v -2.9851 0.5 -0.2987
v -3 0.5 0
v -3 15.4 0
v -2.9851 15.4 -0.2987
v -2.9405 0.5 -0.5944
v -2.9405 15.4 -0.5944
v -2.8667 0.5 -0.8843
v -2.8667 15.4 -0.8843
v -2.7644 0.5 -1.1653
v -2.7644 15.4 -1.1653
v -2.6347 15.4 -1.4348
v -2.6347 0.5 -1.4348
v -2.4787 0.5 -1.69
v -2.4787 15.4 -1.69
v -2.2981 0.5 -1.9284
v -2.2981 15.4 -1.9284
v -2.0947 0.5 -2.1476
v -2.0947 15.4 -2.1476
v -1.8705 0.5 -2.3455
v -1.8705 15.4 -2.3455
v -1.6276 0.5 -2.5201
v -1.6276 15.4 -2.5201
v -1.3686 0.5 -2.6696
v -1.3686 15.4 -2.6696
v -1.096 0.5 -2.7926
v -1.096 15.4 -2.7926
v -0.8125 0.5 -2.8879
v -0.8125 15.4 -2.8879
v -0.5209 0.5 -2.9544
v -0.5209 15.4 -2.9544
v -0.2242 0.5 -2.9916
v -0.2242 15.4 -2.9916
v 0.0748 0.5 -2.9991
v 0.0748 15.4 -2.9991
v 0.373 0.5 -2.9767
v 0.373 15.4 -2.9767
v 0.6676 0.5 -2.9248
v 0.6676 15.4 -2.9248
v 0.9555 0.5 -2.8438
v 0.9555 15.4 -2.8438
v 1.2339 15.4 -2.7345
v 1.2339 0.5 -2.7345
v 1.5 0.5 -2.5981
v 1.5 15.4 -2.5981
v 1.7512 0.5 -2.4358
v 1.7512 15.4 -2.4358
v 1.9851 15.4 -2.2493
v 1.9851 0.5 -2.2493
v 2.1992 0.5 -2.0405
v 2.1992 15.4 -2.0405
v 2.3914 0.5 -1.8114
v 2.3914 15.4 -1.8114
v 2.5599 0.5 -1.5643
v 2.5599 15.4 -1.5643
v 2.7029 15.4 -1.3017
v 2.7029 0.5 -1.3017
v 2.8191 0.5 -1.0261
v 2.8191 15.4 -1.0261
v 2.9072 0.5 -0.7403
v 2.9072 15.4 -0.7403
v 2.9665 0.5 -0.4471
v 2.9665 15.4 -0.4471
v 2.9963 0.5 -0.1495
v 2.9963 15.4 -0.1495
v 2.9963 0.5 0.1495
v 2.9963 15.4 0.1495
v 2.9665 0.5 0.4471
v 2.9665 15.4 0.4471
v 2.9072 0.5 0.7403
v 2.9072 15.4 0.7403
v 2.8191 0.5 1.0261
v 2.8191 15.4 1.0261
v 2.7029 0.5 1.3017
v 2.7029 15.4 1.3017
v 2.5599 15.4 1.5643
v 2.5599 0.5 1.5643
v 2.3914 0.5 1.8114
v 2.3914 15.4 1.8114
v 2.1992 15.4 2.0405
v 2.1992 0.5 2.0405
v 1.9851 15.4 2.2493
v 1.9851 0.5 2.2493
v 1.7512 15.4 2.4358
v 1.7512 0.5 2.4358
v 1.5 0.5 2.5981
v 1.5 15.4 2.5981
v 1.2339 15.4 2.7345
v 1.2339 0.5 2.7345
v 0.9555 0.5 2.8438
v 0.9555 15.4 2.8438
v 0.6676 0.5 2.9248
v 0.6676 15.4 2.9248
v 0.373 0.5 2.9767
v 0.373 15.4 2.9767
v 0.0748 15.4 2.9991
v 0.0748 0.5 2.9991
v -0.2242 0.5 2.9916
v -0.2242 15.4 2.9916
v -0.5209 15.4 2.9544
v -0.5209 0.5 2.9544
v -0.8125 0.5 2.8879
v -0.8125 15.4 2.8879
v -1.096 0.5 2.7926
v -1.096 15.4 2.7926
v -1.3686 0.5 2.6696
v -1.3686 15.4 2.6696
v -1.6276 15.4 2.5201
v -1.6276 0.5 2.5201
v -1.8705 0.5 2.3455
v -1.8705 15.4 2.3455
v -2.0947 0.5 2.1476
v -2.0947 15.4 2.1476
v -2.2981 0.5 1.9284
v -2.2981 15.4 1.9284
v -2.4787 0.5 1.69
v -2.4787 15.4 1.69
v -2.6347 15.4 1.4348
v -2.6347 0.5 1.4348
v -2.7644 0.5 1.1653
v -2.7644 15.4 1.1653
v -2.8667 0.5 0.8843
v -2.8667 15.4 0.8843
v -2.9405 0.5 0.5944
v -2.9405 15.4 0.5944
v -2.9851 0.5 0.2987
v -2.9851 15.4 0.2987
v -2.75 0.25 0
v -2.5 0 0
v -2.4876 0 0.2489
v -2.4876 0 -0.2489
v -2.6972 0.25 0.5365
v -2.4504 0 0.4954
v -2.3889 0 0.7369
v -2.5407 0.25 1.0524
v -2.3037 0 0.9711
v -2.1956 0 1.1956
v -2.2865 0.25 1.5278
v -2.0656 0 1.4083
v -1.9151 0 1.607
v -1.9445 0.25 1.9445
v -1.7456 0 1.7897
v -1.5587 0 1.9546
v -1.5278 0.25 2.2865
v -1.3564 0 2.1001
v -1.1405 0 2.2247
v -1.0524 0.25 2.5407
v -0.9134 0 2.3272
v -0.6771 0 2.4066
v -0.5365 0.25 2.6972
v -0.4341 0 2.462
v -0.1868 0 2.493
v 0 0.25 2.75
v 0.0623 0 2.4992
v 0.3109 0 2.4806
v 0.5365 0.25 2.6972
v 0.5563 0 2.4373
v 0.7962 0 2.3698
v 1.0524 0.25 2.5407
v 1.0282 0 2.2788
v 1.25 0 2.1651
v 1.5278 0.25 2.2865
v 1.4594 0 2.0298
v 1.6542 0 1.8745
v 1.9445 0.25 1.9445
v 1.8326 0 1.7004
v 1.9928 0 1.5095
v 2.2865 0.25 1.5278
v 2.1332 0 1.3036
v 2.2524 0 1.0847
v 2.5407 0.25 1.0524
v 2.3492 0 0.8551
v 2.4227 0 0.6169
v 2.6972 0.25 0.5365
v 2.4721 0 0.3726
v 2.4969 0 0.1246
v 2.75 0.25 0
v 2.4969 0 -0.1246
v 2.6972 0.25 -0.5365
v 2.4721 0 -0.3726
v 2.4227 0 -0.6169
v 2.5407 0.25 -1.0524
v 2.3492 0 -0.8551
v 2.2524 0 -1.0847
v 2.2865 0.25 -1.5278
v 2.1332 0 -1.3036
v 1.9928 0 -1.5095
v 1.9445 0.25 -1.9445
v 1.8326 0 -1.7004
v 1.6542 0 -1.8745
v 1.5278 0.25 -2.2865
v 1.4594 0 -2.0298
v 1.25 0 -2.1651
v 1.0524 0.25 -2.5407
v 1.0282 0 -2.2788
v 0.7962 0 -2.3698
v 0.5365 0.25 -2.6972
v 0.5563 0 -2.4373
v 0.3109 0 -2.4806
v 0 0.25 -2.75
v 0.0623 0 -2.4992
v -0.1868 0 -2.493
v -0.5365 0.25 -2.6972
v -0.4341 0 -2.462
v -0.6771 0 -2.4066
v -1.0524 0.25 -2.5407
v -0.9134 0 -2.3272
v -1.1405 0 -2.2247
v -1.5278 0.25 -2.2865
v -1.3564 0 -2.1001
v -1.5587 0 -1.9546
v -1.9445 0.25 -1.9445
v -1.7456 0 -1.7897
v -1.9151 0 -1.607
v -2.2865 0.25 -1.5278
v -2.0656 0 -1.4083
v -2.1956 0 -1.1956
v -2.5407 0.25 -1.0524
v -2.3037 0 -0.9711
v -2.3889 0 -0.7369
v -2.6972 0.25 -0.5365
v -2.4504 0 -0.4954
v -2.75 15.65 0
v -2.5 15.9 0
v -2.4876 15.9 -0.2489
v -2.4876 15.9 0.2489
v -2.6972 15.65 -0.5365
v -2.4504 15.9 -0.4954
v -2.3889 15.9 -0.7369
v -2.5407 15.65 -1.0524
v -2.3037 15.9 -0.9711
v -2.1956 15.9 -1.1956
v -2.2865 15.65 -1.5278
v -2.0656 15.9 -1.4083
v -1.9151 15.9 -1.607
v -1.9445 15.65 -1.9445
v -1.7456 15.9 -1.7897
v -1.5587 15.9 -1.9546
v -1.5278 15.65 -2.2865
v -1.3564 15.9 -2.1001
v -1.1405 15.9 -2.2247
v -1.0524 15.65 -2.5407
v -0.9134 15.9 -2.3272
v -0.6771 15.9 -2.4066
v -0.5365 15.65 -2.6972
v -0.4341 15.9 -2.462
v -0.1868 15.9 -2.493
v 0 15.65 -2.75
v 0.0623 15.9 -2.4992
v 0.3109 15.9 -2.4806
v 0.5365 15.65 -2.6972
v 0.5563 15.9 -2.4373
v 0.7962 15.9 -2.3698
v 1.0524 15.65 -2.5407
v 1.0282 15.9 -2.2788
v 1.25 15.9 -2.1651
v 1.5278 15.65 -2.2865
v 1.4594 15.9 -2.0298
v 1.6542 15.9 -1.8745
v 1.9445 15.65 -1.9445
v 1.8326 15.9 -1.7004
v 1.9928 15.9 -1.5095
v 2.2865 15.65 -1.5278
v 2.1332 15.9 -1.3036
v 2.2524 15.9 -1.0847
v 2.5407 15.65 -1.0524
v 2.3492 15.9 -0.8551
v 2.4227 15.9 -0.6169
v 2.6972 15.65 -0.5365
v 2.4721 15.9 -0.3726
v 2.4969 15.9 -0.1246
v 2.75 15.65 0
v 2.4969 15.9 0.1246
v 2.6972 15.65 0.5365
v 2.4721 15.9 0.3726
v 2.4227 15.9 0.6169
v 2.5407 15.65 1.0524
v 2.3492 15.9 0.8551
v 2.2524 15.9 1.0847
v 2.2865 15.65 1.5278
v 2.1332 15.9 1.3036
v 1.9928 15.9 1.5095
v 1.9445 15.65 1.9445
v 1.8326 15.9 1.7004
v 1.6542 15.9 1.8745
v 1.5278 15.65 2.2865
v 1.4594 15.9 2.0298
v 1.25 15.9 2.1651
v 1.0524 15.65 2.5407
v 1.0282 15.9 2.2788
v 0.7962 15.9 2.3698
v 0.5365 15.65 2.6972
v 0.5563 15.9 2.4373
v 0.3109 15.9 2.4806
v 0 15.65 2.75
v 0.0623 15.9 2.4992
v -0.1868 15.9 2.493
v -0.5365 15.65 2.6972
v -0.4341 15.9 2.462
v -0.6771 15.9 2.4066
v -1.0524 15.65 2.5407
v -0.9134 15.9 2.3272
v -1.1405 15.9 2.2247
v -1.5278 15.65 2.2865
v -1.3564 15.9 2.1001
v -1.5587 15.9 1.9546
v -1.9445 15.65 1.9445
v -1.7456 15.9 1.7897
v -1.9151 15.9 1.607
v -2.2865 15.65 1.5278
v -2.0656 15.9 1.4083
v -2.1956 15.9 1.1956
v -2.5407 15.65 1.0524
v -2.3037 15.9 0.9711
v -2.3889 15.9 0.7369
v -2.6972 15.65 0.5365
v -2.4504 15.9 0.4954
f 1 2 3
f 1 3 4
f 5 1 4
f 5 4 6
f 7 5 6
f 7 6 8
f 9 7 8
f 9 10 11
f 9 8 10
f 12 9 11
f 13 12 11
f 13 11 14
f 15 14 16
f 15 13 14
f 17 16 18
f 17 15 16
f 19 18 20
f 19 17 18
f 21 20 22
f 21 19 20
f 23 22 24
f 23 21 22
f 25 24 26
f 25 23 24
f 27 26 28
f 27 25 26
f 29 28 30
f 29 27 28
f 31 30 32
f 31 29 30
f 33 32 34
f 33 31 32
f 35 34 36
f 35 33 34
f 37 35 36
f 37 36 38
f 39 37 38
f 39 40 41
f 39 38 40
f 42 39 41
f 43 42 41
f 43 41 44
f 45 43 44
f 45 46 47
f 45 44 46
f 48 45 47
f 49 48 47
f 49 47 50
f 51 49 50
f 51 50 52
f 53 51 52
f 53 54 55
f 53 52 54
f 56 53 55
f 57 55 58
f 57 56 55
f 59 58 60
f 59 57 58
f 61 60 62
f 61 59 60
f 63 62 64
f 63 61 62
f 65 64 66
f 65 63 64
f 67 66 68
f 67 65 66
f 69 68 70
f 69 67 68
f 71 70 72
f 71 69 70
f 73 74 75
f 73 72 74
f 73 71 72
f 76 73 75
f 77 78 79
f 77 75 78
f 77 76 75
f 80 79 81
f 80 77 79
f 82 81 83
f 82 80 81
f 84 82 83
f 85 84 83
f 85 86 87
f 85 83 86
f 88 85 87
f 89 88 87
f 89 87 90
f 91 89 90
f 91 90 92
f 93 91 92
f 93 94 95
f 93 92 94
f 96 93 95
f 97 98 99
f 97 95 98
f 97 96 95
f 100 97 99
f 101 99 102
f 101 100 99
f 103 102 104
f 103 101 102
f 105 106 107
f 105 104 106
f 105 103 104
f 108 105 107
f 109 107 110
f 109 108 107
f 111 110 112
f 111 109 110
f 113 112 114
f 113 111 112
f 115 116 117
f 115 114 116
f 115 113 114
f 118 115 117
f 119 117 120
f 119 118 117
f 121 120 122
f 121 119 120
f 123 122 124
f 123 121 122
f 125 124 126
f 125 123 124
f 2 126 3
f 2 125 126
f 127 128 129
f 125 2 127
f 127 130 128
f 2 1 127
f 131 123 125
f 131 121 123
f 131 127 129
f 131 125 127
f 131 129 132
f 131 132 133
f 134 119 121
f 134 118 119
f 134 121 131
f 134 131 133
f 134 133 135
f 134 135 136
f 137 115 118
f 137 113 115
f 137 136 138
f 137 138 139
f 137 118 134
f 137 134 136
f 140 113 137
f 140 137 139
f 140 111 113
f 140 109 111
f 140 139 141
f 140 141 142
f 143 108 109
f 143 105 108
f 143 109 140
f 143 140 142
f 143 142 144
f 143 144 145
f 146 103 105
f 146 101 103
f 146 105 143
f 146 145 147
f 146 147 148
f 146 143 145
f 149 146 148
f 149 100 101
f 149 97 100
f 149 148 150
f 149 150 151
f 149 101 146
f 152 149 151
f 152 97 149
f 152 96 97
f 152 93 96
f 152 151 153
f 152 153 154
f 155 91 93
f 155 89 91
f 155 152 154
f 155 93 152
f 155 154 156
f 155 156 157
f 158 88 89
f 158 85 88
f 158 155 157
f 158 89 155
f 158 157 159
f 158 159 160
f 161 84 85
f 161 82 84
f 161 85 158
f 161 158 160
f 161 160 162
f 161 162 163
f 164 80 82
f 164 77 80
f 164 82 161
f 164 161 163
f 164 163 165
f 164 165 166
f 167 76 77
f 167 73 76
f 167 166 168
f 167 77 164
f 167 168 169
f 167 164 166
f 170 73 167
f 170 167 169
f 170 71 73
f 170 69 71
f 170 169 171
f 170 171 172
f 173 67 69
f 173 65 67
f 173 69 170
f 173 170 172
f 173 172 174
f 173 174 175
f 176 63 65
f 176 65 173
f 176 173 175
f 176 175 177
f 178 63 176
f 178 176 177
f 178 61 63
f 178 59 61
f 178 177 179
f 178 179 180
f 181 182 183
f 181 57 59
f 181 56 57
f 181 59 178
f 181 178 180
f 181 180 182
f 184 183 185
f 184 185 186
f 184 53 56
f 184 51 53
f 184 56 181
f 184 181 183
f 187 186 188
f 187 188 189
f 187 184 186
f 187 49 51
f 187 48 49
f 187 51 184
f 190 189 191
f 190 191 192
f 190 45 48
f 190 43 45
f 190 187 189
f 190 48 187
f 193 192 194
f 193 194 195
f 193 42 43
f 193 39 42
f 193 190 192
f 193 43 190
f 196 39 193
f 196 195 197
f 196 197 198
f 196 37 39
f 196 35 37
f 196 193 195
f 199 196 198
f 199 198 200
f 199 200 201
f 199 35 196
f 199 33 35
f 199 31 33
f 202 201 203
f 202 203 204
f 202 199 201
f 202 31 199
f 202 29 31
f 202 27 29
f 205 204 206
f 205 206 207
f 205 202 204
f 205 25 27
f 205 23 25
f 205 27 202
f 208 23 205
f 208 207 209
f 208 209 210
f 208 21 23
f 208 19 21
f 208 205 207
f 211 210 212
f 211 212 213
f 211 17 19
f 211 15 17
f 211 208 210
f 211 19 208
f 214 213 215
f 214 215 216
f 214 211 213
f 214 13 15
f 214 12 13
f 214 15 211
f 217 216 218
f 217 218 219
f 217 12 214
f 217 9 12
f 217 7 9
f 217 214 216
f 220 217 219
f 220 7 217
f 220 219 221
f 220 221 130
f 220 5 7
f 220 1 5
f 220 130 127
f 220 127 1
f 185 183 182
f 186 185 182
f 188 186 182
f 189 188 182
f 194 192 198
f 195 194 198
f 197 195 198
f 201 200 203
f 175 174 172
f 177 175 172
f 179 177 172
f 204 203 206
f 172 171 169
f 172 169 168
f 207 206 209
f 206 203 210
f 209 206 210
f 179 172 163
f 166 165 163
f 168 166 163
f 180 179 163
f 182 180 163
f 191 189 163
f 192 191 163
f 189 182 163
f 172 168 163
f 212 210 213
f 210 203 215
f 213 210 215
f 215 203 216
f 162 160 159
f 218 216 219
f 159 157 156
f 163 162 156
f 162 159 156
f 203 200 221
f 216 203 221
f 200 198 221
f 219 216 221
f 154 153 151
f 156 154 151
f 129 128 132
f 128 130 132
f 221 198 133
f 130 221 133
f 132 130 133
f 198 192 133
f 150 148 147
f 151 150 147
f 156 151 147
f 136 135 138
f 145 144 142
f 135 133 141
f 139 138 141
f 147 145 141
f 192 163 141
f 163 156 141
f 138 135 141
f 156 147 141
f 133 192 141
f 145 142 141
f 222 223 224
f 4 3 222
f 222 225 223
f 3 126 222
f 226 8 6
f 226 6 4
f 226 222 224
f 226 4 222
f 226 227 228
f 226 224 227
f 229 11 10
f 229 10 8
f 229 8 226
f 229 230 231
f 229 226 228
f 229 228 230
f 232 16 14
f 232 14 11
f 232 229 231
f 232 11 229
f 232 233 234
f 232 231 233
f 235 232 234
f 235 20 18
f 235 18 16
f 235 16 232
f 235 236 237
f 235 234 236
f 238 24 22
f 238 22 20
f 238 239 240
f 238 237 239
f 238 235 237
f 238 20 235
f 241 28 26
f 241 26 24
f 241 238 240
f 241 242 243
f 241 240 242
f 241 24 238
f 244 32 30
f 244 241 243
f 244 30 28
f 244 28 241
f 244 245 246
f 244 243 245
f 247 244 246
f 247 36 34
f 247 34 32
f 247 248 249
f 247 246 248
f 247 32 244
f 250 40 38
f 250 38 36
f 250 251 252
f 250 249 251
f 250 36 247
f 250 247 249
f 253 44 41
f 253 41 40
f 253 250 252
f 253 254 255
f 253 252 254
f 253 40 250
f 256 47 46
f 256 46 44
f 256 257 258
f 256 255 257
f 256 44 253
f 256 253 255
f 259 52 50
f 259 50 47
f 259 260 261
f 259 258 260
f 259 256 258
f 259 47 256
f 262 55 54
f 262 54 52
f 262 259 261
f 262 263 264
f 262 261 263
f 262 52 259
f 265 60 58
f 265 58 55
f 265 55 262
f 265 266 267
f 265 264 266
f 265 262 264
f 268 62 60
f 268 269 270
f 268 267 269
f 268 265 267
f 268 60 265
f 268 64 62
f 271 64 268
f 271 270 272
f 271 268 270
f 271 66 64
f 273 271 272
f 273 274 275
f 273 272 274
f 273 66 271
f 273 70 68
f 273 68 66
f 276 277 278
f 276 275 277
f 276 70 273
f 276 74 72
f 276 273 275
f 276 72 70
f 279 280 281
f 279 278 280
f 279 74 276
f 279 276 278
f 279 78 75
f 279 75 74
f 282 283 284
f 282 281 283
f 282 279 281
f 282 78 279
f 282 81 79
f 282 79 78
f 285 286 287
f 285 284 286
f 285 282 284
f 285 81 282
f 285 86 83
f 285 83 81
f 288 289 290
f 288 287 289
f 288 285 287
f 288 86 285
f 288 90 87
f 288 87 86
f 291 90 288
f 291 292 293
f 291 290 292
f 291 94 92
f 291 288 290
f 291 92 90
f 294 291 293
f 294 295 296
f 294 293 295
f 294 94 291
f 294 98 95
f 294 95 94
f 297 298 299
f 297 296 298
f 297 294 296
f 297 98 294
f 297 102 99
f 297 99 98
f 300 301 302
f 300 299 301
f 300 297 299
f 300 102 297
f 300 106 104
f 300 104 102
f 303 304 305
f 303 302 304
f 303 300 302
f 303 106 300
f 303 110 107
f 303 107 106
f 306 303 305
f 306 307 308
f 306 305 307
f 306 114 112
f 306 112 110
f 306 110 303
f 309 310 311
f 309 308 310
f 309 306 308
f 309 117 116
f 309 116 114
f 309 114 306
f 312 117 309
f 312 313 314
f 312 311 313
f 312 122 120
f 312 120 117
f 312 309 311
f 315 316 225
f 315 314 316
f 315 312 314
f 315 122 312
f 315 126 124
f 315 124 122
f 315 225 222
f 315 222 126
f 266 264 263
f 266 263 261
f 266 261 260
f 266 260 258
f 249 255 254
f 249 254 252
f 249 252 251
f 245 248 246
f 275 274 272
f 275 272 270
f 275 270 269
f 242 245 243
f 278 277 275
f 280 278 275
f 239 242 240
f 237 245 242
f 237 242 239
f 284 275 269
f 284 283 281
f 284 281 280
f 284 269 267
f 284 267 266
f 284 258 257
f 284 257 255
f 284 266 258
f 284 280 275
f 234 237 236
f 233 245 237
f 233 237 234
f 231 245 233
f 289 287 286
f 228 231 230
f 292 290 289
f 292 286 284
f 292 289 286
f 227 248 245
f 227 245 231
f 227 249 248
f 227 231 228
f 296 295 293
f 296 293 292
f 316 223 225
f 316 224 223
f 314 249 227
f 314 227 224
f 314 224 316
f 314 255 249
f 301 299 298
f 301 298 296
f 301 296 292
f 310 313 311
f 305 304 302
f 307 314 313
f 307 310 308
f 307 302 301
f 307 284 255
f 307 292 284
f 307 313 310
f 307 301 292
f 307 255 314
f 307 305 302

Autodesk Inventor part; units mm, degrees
ref_plane "YZ Plane" through (0, 0, 0) normal (1, 0, 0) x (0, 1, 0)
ref_plane "XZ Plane" through (0, 0, 0) normal (0, 1, 0) x (-1, 0, 0)
ref_plane "XY Plane" through (0, 0, 0) normal (0, 0, 1) x (1, 0, 0)
sketch "Sketch1" plane through (0, 0, 0) normal (0, 1, 0) x (-1, 0, 0)
  circle A0 centre (0, 0) radius 3
  dimension "d0" = 6
extrude "Extrusion1" add sketch "Sketch1" along normal blind 15.9
chamfer "Chamfer1" distance 0.5 angle 45 1 edges at (3, 15.9, 0)
chamfer "Chamfer2" distance 0.5 angle 45 1 edges at (3, 0, 0)
thread "Thread1" size "M6x1" class "6g" standard "ANSI Metric M Profile" full length
properties part number "din m6-10 Flat point socket set screw"
